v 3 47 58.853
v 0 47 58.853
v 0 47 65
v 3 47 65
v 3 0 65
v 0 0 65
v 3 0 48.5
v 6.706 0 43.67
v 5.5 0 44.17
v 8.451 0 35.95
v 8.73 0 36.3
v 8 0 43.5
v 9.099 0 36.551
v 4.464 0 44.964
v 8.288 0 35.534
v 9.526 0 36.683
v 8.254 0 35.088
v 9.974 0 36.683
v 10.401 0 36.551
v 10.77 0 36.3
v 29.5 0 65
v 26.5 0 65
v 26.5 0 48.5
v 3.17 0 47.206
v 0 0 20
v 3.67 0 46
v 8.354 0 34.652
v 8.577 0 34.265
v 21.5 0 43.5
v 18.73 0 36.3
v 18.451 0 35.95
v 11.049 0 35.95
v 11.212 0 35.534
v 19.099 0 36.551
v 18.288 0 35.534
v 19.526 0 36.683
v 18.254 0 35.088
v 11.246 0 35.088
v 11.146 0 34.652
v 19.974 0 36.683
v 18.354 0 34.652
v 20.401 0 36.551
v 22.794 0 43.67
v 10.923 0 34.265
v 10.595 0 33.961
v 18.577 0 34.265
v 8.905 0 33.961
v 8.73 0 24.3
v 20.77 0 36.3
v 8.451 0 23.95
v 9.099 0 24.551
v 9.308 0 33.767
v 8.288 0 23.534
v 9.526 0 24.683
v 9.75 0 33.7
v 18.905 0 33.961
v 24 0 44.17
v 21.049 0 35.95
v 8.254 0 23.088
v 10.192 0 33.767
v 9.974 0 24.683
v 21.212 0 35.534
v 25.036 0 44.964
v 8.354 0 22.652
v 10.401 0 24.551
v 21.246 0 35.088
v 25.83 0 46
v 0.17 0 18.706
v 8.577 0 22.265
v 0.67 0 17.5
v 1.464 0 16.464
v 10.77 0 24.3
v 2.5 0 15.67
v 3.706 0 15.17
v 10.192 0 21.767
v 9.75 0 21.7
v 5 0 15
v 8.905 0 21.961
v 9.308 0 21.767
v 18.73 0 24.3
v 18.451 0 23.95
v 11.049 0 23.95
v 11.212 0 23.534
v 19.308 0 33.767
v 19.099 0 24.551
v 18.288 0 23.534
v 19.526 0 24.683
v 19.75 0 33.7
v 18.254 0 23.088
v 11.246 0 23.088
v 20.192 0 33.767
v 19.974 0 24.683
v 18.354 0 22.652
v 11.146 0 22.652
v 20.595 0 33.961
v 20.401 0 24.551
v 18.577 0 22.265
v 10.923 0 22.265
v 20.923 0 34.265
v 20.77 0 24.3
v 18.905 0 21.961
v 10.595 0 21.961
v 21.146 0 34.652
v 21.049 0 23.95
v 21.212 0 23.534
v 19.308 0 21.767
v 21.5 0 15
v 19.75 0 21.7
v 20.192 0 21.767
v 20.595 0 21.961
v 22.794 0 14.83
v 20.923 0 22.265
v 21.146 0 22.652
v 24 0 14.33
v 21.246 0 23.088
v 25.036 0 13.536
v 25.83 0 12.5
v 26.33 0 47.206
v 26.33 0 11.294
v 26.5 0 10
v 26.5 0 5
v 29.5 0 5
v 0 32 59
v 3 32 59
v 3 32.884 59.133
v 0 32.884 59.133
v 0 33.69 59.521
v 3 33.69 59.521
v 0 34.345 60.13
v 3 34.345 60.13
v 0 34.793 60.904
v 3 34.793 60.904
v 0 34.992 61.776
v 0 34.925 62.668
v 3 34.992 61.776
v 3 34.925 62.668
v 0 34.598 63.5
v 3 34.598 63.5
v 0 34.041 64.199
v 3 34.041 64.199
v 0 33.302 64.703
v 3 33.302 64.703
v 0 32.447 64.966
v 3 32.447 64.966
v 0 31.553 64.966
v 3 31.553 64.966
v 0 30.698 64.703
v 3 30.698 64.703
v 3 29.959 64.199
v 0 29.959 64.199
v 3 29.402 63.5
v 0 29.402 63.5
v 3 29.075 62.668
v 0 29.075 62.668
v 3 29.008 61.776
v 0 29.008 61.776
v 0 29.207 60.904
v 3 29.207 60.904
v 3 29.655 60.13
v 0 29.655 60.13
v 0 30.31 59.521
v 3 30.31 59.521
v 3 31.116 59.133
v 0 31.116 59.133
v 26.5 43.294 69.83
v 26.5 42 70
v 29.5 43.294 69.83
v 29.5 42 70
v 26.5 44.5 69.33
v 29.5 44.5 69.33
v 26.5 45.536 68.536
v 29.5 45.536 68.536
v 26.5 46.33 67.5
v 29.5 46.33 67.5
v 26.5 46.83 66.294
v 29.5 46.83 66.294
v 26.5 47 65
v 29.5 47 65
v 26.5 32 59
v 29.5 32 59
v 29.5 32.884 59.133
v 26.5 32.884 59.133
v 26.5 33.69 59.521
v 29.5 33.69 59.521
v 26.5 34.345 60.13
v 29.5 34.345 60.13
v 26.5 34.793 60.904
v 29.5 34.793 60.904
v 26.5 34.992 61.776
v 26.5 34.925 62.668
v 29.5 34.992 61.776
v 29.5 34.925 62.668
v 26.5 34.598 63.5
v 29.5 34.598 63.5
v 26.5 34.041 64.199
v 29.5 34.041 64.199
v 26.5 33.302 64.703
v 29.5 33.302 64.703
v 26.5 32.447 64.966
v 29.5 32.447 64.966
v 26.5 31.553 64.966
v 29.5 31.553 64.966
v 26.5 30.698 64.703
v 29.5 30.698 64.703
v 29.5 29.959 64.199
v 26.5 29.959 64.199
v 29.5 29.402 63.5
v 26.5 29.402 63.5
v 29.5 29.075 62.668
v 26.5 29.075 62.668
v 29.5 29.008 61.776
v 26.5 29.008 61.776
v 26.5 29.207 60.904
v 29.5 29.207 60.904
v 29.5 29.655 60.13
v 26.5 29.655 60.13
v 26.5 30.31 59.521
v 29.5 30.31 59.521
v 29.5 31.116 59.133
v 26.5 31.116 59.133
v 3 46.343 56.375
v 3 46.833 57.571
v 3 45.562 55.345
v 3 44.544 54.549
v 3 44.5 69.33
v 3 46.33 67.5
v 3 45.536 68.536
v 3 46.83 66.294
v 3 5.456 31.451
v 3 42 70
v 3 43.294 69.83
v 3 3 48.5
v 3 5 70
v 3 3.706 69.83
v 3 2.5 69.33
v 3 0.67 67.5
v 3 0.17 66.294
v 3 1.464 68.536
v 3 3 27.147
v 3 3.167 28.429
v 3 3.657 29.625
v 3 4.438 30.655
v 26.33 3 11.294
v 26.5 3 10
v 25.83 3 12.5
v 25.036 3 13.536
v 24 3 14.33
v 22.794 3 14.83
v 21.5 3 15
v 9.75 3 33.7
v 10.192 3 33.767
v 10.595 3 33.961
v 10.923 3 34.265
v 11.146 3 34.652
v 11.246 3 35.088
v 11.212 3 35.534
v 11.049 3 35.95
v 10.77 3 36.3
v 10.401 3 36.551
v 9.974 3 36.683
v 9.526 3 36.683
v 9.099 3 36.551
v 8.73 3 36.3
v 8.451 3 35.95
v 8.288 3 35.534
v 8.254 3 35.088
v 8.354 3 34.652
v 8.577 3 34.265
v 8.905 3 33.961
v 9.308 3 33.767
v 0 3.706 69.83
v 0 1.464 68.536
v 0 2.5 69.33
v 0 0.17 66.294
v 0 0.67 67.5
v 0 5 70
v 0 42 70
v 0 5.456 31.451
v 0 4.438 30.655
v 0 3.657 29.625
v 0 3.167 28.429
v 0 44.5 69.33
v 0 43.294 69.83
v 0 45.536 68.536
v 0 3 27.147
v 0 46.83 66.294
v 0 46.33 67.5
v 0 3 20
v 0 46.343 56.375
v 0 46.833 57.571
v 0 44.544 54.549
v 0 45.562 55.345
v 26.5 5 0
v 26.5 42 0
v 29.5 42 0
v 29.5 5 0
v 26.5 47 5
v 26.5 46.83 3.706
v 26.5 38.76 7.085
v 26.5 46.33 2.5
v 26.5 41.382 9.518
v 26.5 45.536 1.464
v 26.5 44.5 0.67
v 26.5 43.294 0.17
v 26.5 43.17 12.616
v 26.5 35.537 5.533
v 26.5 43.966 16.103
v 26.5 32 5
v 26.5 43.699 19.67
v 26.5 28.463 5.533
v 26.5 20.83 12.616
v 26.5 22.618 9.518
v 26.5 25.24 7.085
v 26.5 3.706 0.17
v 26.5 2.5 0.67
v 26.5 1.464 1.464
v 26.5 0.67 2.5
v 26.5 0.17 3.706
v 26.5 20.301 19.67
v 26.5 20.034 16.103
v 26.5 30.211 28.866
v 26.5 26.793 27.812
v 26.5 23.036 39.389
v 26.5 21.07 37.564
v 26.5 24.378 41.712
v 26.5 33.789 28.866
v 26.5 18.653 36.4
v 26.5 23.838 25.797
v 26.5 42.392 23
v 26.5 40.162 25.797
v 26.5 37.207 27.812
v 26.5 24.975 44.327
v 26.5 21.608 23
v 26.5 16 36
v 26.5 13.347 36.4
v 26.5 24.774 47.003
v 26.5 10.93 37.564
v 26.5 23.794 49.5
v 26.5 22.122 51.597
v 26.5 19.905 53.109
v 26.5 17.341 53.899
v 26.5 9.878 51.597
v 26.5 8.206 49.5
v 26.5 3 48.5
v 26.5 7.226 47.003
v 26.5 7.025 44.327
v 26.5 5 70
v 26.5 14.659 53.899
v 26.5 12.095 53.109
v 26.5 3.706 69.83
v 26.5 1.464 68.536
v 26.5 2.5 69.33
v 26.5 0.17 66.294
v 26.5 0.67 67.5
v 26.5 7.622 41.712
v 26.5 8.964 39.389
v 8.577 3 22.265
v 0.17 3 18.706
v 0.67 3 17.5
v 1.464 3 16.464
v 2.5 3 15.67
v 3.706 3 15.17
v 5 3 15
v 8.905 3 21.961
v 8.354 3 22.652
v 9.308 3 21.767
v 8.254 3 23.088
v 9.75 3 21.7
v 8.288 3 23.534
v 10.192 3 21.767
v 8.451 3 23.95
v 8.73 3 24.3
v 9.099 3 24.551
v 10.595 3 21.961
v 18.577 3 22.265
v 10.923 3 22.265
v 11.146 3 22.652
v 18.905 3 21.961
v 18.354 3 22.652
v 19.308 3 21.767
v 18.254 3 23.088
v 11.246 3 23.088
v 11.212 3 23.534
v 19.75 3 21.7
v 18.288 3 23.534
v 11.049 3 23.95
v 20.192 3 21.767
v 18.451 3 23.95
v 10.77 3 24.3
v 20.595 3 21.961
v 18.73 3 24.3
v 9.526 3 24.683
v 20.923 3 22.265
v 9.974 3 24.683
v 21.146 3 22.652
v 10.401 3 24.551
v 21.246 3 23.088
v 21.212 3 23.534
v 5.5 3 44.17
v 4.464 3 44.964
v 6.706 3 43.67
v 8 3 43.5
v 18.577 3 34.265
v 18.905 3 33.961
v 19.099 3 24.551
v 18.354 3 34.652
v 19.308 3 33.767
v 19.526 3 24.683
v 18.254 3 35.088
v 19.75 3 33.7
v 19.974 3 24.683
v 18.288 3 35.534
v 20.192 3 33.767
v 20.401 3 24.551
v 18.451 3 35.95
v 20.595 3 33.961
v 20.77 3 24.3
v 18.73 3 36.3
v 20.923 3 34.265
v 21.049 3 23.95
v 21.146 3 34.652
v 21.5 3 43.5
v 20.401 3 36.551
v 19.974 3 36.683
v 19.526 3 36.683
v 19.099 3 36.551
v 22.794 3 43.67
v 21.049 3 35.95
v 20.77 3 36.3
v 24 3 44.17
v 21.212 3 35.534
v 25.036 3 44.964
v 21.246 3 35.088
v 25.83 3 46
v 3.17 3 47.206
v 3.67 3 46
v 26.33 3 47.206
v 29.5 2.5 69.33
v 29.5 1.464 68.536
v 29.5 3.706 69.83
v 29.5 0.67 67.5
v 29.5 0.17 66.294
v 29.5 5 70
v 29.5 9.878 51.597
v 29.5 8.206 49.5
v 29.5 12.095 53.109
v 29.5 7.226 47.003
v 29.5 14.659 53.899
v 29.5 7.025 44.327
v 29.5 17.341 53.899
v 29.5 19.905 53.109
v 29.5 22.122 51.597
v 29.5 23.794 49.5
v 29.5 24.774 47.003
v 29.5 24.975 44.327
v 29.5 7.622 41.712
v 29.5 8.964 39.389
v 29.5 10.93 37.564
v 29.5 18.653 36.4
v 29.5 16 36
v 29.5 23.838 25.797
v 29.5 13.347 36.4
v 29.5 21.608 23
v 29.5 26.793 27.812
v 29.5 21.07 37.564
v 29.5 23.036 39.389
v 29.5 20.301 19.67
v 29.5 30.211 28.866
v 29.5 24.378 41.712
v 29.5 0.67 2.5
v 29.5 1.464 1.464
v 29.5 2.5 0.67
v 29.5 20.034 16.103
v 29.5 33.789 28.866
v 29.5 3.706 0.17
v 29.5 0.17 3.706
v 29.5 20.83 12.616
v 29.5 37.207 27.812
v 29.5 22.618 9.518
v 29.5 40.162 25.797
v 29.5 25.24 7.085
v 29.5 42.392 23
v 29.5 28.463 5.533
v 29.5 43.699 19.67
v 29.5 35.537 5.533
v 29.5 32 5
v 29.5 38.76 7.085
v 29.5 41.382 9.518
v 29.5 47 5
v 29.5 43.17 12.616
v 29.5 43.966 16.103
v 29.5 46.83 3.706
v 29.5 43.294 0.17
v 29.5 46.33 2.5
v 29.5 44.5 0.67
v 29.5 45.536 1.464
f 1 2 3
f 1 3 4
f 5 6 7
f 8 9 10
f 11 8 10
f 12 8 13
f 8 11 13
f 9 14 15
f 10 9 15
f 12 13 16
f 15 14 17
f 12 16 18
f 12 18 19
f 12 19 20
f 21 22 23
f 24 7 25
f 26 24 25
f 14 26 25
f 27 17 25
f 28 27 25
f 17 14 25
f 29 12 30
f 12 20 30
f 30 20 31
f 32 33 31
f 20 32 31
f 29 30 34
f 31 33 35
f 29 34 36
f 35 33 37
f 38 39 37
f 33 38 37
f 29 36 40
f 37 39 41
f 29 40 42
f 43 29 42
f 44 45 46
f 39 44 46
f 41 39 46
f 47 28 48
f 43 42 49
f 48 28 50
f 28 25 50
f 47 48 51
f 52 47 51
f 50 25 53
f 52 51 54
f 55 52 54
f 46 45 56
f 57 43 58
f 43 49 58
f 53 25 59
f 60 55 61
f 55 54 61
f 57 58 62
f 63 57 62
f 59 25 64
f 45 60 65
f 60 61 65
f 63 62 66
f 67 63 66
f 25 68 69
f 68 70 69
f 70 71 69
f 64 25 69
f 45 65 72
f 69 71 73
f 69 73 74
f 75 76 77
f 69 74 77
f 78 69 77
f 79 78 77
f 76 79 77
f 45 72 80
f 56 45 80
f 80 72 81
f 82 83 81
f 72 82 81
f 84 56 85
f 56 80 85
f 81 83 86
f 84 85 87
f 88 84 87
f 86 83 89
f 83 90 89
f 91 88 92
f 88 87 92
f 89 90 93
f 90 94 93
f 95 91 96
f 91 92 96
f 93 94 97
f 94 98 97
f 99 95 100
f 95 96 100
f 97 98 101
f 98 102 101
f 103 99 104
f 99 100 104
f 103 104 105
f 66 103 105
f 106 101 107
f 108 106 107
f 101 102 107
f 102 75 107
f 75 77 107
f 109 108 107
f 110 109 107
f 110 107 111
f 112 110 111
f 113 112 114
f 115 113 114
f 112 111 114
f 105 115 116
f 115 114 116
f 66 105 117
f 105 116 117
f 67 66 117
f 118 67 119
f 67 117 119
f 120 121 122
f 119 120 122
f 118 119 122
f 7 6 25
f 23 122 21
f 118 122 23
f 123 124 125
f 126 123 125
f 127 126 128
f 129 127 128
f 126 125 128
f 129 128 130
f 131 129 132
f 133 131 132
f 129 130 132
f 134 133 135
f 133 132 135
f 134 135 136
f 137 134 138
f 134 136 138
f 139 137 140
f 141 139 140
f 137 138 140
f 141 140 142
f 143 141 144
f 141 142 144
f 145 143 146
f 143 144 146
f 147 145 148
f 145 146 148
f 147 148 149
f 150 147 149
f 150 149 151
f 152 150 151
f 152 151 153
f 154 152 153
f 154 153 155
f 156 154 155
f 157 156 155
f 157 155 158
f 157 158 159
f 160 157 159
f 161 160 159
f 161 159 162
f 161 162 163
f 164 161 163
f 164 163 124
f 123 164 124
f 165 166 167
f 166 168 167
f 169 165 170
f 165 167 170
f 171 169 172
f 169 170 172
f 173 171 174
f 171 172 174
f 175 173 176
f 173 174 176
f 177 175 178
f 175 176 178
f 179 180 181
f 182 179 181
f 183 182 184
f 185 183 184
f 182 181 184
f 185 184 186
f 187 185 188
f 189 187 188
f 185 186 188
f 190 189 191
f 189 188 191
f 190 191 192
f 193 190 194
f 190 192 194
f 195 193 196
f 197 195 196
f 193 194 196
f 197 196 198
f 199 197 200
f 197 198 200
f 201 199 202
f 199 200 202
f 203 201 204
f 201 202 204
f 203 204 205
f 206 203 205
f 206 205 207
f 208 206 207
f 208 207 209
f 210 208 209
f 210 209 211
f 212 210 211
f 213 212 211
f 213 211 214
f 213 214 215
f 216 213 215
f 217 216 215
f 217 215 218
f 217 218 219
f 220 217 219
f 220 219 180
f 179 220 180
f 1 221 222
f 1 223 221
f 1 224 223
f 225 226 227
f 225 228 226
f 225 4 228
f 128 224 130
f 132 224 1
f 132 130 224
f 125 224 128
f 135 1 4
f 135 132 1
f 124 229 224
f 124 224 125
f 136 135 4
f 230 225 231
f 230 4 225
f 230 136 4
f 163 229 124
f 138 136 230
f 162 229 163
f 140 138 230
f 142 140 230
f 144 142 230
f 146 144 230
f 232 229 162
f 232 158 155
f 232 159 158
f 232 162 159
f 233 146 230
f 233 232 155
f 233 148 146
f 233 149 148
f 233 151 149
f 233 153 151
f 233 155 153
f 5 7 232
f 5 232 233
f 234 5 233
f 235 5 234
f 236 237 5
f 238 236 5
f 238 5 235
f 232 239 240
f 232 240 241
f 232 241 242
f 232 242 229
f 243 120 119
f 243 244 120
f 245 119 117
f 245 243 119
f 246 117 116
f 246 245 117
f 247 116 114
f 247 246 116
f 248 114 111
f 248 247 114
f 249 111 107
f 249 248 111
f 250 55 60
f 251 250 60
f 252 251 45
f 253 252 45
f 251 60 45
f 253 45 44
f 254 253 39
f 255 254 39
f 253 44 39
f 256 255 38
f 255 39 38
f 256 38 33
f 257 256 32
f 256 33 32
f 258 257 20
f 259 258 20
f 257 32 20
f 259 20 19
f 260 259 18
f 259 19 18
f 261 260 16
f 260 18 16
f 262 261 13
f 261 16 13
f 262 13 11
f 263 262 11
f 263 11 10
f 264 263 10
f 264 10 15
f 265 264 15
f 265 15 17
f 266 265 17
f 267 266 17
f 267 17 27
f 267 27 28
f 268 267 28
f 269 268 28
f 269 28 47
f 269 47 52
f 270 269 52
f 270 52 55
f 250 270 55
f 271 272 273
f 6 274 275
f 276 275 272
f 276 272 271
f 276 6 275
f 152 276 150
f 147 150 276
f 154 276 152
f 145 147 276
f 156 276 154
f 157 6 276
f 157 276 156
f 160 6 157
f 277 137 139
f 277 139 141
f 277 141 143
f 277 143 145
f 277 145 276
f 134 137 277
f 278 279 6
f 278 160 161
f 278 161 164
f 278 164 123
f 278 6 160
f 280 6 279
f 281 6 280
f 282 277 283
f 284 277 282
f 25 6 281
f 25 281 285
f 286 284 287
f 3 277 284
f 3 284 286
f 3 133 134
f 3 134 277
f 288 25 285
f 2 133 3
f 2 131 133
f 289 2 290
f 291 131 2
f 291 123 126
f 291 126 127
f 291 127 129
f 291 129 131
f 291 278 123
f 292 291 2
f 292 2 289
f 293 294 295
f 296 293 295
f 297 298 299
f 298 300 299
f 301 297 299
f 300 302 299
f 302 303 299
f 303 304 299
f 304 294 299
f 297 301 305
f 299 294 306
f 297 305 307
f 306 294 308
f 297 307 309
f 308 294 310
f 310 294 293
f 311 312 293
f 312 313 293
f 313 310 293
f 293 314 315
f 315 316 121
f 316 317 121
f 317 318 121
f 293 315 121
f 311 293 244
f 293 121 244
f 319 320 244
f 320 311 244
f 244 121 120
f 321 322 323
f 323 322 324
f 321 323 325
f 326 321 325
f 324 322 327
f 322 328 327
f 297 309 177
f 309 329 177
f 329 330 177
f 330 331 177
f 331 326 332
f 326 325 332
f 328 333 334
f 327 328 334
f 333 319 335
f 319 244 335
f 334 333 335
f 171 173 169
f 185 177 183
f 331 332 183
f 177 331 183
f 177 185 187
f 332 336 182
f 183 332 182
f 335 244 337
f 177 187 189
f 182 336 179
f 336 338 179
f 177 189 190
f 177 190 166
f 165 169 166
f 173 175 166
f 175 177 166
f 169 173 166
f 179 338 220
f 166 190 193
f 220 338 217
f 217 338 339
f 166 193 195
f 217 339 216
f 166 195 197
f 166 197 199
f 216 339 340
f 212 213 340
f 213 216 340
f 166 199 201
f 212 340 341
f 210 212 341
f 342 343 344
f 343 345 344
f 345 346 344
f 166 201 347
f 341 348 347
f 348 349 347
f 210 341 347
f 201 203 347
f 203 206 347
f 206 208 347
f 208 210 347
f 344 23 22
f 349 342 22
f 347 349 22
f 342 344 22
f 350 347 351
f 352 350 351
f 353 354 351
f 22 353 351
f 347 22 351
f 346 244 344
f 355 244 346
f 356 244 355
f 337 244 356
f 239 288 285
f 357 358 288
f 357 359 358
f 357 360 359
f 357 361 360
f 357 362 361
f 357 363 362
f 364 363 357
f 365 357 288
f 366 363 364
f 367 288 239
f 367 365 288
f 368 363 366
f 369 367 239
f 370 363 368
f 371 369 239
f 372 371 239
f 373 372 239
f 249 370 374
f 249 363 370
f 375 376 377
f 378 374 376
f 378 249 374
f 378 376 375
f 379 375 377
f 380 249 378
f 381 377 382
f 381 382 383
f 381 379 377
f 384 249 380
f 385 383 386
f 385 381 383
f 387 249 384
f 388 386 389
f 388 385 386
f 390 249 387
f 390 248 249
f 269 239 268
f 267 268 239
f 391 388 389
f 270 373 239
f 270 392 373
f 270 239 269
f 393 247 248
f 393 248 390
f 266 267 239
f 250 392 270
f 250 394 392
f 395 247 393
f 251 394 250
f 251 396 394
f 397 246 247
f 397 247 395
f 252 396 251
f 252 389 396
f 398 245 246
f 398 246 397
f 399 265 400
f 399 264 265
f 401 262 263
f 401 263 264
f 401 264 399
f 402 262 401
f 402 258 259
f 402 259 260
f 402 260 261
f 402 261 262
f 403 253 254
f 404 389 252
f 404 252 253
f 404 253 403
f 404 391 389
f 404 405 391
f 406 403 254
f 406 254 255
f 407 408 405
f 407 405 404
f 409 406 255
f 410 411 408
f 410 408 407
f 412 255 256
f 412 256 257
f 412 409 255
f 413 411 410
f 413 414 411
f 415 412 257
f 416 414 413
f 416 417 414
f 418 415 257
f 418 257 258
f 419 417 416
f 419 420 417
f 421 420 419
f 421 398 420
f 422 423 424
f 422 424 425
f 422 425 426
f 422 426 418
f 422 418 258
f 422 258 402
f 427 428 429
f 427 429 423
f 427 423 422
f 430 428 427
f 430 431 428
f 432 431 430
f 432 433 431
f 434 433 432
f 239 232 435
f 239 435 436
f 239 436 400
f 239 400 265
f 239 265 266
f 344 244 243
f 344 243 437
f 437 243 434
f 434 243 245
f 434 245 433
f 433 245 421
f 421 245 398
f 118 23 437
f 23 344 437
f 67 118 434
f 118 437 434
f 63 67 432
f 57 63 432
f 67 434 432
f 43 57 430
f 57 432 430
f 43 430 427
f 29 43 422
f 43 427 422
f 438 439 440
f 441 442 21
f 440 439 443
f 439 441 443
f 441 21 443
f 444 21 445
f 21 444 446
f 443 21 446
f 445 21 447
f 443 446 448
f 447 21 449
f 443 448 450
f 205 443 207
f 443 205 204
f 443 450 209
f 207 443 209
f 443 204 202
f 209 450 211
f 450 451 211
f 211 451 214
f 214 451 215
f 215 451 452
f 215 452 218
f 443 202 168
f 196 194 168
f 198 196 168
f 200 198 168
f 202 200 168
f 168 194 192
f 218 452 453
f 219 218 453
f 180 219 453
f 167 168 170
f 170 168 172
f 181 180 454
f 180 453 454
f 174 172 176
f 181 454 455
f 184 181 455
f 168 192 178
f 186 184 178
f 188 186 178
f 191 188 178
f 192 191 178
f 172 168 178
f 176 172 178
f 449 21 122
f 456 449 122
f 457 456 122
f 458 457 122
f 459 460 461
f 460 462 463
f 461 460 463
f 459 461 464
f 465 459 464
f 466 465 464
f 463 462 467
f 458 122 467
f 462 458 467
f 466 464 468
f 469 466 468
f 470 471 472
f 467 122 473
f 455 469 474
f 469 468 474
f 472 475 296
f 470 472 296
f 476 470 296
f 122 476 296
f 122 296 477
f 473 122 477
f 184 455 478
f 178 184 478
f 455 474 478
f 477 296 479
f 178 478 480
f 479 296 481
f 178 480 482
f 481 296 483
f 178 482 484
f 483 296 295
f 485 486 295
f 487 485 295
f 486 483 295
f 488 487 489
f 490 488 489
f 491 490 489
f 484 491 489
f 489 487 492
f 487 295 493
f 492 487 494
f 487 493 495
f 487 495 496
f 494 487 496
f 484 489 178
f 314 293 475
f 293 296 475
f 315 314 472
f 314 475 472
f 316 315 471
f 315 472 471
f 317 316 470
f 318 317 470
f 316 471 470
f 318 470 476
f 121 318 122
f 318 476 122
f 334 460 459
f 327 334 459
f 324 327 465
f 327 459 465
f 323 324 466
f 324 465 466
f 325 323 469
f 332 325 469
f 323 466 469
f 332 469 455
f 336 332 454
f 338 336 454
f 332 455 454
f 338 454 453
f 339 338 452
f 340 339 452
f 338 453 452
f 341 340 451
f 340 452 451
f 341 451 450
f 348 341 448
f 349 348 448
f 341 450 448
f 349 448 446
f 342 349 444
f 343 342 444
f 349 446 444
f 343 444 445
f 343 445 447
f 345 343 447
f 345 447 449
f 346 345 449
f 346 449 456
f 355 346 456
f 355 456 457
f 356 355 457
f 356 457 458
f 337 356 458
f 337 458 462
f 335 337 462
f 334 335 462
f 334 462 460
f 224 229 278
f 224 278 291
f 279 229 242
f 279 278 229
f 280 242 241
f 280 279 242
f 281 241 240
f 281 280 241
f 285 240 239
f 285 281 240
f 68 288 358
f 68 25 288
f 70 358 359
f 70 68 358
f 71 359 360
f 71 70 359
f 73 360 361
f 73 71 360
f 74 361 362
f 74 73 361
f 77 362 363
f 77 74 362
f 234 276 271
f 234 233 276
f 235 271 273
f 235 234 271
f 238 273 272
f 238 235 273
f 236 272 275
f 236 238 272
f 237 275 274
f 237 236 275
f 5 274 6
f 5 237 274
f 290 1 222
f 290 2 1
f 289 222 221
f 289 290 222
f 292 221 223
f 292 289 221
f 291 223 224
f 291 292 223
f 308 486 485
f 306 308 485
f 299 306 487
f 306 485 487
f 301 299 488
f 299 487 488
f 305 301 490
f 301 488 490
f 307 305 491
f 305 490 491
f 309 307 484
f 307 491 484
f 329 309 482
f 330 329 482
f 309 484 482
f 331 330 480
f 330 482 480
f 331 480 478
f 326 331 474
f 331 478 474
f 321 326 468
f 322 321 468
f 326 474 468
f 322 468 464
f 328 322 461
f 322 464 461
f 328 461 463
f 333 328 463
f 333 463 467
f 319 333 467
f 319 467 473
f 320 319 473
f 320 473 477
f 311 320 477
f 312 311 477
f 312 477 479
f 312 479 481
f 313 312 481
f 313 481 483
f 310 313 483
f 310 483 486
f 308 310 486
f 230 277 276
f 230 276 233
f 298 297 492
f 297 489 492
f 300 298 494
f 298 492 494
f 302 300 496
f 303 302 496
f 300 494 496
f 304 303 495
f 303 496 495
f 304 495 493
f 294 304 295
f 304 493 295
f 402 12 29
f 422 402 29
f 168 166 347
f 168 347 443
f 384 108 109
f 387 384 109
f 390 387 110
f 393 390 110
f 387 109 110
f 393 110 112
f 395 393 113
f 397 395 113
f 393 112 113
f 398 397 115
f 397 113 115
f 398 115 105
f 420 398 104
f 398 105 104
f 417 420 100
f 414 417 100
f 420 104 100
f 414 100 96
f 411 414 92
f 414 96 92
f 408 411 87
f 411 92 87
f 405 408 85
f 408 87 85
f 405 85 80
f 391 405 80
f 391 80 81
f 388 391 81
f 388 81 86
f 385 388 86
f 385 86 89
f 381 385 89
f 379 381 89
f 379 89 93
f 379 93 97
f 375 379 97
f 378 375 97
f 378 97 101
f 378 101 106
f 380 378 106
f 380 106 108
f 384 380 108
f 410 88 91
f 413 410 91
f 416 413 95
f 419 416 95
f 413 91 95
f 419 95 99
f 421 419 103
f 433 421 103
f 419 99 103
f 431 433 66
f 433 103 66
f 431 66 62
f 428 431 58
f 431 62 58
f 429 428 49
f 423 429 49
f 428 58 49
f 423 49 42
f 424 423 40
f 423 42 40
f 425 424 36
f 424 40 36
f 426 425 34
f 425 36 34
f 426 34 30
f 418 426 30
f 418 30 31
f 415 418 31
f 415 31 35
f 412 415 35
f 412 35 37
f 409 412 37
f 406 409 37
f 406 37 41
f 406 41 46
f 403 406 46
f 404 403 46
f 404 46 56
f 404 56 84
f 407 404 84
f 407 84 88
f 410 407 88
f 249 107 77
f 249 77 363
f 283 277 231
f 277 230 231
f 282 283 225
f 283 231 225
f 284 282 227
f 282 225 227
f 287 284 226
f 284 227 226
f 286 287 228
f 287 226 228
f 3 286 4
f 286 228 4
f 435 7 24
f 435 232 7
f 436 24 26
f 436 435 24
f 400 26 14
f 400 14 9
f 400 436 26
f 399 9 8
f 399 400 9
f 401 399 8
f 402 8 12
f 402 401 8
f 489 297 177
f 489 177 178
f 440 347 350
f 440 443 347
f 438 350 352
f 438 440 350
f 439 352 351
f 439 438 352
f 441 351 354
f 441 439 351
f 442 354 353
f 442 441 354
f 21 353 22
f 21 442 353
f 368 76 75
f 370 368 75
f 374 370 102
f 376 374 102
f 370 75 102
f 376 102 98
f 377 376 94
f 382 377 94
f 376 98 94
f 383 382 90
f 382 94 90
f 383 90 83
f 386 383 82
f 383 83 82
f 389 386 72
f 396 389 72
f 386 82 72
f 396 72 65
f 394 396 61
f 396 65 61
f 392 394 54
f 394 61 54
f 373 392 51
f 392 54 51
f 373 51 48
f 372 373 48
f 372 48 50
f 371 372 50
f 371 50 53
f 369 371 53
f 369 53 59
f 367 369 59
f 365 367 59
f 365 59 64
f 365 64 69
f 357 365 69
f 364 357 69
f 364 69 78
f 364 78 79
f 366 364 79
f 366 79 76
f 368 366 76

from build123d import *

# Parameters (mm, degrees)
SKETCH_1_W           = 29.5
SKETCH_1_H           = 47
EXTRUDE_1_DEPTH      = 70
SKETCH_2_W           = 23.5
SKETCH_2_H           = 44
CUT_EXTRUDE_1_DEPTH  = 70
SKETCH_5_R           = 12
SKETCH_5_R_2         = 3
CUT_EXTRUDE_4_DEPTH  = 70
SKETCH_10_R          = 9
CUT_EXTRUDE_8_DEPTH  = 17
SKETCH_11_W          = 23.5
SKETCH_11_H          = 26.5
SKETCH_11_H_2        = 15
CUT_EXTRUDE_9_DEPTH  = 10
FILLET_2_R           = 5
CUT_EXTRUDE_11_DEPTH = 10
FILLET_3_R           = 5
SKETCH_14_R          = 1.5
CUT_EXTRUDE_12_DEPTH = 10


with BuildPart() as part:
    # 草图1 → 凸台-拉伸1 (new body)
    with BuildSketch(Plane.XY):
        with Locations((14.75, 23.5)):
            Rectangle(SKETCH_1_W, SKETCH_1_H)
    extrude(amount=EXTRUDE_1_DEPTH)

    # 草图2 → 切除-拉伸1 (cut)
    with BuildSketch(Plane.XY.offset(70)):
        with Locations((14.75, 25)):
            Rectangle(SKETCH_2_W, SKETCH_2_H)
    extrude(amount=-CUT_EXTRUDE_1_DEPTH, mode=Mode.SUBTRACT)

    # 草图5 → 切除-拉伸4 (cut)
    with BuildSketch(Plane(origin=(29.5, 0, 0), x_dir=(0, 0, -1), z_dir=(1, 0, 0))):
        with Locations((-17, 32)):
            Circle(SKETCH_5_R)
        with Locations((-62, 32)):
            Circle(SKETCH_5_R_2)
    extrude(amount=-CUT_EXTRUDE_4_DEPTH, mode=Mode.SUBTRACT)

    # 草图10 → 切除-拉伸8 (cut)
    with BuildSketch(Plane(origin=(29.5, 0, 0), x_dir=(0, 0, -1), z_dir=(1, 0, 0))):
        with Locations((-45, 16)):
            Circle(SKETCH_10_R)
    extrude(amount=-CUT_EXTRUDE_8_DEPTH, mode=Mode.SUBTRACT)

    # 草图11 → 切除-拉伸9 (cut)
    with BuildSketch(Plane.XZ):
        with Locations((14.75, 56.75)):
            Rectangle(SKETCH_11_W, SKETCH_11_H)
        with Locations((14.75, 7.5)):
            Rectangle(SKETCH_11_W, SKETCH_11_H_2)
    extrude(amount=-CUT_EXTRUDE_9_DEPTH, mode=Mode.SUBTRACT)

    # 圆角2
    fillet_2_edges = [part.edges().sort_by_distance(p)[0] for p in [
        (1.5, 0, 0),
        (28, 0, 0),
        (28, 0, 70),
        (1.5, 0, 70),
        (3, 1.5, 43.5),
        (26.5, 1.5, 43.5),
    ]]
    fillet(fillet_2_edges, radius=FILLET_2_R)

    # 草图13 → 切除-拉伸11 (cut)
    with BuildSketch(Plane(origin=(3, 0, 0), x_dir=(0, 0, -1), z_dir=(1, 0, 0))):
        Polygon((-15, 0), (-15, 3), (-30, 3), (-56, 47), (0, 47), (0, 0), align=None)
    extrude(amount=-CUT_EXTRUDE_11_DEPTH, mode=Mode.SUBTRACT)

    # 圆角3
    fillet_3_edges = [part.edges().sort_by_distance(p)[0] for p in [
        (28, 47, 70),
        (0, 1.5, 15),
        (1.5, 3, 30),
        (1.5, 47, 56),
        (1.5, 47, 70),
        (28, 47, 0),
        (26.5, 1.5, 15),
    ]]
    fillet(fillet_3_edges, radius=FILLET_3_R)

    # 草图14 → 切除-拉伸12 (cut)
    with BuildSketch(Plane.XZ):
        with Locations(Location((9.75, 35.2, 0), (0, 0, 270))):
            Circle(SKETCH_14_R)
        with Locations(Location((9.75, 23.2, 0), (0, 0, 270))):
            Circle(SKETCH_14_R)
        with Locations(Location((19.75, 23.2, 0), (0, 0, 270))):
            Circle(SKETCH_14_R)
        with Locations(Location((19.75, 35.2, 0), (0, 0, 270))):
            Circle(SKETCH_14_R)
    extrude(amount=-CUT_EXTRUDE_12_DEPTH, mode=Mode.SUBTRACT)


solid = part.part
